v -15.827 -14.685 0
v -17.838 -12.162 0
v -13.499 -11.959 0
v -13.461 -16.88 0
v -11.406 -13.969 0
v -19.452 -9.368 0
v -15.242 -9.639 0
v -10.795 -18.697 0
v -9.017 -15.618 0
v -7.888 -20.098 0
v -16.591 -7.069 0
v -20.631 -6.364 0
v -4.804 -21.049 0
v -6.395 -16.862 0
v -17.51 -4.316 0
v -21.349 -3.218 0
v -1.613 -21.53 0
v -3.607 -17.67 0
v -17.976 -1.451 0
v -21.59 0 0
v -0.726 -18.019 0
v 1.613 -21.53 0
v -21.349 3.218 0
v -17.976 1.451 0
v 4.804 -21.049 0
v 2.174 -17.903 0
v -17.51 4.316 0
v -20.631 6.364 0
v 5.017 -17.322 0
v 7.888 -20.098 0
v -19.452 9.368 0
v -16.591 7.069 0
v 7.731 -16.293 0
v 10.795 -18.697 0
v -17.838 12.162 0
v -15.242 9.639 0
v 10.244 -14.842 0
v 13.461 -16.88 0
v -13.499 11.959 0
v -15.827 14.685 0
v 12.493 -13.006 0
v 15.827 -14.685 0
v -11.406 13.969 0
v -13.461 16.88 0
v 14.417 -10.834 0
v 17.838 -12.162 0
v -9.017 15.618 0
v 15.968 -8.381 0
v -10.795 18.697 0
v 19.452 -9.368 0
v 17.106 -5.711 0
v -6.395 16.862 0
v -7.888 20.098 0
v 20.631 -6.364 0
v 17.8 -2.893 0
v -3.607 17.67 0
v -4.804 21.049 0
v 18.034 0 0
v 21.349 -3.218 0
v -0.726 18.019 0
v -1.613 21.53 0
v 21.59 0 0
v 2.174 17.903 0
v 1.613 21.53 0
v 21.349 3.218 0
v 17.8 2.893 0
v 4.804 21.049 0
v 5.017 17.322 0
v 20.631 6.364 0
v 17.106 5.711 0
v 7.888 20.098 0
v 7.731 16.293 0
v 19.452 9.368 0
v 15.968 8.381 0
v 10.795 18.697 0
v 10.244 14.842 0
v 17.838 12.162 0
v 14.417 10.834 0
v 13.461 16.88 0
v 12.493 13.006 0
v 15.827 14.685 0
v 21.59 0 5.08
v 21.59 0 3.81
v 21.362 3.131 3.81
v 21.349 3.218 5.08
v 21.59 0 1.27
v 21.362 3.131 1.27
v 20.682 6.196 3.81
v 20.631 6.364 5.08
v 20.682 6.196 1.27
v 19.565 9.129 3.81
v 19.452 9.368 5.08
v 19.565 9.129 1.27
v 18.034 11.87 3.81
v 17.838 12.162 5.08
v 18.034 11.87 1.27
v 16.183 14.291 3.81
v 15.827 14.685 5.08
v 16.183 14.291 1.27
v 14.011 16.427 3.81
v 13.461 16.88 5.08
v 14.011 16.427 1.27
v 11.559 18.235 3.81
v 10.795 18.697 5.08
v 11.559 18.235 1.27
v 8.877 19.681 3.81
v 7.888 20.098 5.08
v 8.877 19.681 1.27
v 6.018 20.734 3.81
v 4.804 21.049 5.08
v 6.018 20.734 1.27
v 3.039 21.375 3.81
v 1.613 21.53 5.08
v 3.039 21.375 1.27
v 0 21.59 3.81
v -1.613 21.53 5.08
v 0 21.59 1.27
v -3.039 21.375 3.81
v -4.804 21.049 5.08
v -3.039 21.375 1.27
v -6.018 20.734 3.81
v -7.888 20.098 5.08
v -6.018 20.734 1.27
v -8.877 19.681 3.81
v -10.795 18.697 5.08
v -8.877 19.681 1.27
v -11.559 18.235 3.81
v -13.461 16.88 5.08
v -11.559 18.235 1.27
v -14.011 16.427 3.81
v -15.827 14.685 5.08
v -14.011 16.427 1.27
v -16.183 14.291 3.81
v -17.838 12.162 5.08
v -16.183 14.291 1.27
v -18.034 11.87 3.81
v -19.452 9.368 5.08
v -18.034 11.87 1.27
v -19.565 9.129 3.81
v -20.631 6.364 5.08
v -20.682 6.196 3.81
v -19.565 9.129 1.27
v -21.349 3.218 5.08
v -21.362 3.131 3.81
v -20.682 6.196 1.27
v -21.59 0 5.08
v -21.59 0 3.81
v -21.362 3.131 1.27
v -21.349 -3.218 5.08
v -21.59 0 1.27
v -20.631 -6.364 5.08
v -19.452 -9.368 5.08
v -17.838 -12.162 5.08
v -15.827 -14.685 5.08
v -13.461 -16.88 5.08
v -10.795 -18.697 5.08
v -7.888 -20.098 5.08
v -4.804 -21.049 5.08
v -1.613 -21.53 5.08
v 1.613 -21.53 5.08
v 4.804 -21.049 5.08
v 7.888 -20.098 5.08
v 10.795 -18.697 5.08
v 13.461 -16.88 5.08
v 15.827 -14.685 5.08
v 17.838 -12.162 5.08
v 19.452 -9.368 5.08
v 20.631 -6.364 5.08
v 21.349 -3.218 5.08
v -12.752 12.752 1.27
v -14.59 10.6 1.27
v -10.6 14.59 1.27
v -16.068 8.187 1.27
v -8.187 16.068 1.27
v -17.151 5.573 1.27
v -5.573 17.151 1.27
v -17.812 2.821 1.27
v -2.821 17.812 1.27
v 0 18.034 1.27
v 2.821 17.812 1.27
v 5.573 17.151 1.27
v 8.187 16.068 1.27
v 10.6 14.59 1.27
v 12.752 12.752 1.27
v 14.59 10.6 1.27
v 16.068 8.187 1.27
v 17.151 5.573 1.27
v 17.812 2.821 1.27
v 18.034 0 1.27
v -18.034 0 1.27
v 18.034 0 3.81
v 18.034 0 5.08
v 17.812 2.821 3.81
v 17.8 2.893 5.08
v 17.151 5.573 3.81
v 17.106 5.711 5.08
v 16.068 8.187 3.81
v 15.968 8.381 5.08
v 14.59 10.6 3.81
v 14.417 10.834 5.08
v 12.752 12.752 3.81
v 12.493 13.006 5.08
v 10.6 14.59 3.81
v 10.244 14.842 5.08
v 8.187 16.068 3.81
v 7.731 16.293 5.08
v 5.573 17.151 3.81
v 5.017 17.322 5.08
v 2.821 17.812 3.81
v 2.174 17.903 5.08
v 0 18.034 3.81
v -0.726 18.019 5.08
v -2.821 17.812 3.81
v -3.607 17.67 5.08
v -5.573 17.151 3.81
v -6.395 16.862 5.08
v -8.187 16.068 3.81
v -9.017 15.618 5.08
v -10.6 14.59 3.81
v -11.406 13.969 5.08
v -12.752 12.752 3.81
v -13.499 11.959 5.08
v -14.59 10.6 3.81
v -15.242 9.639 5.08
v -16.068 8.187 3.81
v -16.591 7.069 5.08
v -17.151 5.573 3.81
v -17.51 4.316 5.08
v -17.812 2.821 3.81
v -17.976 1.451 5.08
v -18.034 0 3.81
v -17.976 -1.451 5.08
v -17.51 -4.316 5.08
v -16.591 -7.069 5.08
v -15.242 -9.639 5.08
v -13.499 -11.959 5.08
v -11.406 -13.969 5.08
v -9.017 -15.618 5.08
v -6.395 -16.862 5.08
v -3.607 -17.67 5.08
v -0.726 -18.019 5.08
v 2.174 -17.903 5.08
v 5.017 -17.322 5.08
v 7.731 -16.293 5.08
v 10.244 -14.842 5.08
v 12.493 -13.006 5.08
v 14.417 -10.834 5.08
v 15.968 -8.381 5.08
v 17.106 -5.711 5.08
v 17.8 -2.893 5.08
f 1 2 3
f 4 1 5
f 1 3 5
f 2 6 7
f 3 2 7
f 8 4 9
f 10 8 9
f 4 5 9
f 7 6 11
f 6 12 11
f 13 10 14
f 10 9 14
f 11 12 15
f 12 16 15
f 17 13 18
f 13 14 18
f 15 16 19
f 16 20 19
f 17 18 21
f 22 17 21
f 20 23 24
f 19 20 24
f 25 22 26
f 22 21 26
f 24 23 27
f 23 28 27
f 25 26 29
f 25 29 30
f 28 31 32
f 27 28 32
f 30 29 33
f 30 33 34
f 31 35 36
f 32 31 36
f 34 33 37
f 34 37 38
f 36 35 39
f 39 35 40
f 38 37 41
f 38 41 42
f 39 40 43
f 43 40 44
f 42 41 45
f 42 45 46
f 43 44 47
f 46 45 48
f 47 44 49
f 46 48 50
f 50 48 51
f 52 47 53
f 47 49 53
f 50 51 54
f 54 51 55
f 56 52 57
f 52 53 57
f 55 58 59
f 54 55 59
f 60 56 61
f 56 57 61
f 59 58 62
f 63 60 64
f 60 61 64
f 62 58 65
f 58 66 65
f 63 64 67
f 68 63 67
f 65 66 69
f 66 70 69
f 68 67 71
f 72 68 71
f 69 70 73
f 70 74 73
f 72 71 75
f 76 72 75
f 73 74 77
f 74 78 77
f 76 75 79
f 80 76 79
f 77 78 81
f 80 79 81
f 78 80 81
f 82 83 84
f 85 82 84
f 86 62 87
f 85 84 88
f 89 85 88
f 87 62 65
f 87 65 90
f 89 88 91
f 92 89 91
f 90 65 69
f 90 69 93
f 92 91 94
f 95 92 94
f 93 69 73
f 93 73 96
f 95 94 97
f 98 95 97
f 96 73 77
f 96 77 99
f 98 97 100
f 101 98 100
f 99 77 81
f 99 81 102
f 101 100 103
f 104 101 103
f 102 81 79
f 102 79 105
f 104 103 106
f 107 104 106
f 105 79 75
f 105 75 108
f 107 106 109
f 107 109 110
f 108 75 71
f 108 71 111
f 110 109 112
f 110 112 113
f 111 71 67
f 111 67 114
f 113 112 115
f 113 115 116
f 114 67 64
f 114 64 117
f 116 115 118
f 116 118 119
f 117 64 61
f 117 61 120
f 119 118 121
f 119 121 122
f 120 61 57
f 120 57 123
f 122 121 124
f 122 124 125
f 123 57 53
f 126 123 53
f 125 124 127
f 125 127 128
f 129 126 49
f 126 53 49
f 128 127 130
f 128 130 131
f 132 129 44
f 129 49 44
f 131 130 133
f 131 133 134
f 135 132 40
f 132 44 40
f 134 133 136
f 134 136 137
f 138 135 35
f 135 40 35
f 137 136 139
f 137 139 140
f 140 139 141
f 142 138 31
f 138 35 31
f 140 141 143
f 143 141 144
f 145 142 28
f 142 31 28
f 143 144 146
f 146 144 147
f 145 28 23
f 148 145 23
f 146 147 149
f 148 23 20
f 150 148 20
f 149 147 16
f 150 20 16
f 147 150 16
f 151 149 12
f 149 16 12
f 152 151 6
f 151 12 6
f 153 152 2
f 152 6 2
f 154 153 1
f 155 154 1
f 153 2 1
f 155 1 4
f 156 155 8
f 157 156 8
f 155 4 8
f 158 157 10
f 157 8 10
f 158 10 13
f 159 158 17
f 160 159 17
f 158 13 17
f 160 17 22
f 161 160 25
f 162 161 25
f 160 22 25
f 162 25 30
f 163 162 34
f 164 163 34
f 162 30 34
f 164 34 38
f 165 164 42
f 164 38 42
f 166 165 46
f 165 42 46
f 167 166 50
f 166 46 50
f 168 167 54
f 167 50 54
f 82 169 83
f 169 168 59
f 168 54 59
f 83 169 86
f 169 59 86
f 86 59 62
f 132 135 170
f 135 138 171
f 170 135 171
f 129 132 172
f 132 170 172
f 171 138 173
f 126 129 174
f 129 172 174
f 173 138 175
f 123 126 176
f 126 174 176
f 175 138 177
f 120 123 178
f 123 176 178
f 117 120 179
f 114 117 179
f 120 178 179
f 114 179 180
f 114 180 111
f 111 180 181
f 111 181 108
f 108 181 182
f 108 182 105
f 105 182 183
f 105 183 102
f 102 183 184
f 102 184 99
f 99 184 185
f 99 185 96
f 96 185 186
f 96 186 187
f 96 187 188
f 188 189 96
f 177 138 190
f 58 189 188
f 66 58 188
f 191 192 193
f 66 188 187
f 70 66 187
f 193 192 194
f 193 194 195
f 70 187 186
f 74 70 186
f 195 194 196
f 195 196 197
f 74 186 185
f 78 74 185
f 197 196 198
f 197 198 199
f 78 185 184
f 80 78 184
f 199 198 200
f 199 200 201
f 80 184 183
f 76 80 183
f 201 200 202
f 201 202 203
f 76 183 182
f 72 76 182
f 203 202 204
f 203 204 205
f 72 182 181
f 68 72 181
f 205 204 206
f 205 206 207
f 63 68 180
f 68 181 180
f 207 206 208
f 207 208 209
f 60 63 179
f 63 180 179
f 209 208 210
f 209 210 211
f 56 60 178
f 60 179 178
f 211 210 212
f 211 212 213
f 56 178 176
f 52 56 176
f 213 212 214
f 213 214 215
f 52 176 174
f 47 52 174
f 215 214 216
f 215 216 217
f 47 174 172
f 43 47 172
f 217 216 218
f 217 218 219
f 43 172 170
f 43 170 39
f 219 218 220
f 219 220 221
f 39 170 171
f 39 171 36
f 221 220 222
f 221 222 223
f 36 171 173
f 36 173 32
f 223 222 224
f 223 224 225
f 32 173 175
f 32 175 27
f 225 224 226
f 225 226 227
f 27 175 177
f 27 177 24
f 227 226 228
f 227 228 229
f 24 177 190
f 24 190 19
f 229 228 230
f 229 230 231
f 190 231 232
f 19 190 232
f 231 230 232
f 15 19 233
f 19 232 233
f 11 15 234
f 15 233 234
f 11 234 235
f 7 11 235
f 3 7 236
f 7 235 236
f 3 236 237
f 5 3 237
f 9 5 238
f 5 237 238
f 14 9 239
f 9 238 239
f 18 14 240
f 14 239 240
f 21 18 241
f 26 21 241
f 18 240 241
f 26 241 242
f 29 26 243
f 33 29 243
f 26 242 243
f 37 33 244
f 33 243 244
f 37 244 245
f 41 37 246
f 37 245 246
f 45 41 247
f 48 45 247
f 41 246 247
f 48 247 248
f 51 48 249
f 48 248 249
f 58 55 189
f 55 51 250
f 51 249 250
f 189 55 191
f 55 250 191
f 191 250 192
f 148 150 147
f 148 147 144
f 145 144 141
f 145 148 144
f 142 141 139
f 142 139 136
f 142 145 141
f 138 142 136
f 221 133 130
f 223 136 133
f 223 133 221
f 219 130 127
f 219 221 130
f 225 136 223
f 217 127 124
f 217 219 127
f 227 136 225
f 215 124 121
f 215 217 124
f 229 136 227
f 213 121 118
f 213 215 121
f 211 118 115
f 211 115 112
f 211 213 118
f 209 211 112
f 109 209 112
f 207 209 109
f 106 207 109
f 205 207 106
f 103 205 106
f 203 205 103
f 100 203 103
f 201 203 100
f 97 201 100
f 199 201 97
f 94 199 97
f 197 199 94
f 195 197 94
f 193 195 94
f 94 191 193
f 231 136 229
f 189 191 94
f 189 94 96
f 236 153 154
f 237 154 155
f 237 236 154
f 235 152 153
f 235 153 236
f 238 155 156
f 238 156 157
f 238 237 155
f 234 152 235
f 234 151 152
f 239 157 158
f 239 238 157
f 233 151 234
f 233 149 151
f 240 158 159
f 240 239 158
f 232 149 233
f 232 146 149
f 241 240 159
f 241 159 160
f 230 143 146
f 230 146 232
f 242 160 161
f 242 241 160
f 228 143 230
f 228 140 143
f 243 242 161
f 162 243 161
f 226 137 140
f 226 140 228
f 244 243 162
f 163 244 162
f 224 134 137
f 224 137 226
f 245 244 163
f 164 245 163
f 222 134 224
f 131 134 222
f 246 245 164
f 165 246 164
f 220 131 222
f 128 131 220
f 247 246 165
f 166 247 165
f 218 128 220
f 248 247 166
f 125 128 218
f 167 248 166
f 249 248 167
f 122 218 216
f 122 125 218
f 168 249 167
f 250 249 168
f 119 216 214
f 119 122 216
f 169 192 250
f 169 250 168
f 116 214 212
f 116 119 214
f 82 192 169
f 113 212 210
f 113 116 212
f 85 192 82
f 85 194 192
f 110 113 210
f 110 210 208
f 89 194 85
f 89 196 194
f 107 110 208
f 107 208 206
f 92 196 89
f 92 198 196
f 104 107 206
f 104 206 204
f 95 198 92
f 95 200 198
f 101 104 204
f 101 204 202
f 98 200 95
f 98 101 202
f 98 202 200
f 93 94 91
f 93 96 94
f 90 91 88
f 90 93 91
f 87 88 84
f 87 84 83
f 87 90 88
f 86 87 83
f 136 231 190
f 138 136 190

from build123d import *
from build123d.topology import SkipClean

# Parameters (mm, degrees)
SKETCH1_R                = 21.59
BOSS_EXTRUDE1_DEPTH      = 5.08
SKETCH4_R                = 18.034
CUT_EXTRUDE1_DEPTH       = 31.952586322
SKETCH5_W                = 43.18
SKETCH5_H                = 2.54
CUT_EXTRUDE2_DEPTH       = 31.952586322
BOSS_EXTRUDE2_REACH      = 32.953
BOSS_EXTRUDE2_END_RADIUS = 21.59
SKETCH6_W                = 3.556
SKETCH6_H                = 2.54


with BuildPart() as part:
    # Sketch1 → Boss-Extrude1 (new body)
    with BuildSketch(Plane.XY):
        Circle(SKETCH1_R)
    extrude(amount=BOSS_EXTRUDE1_DEPTH)

    # Sketch4 → Cut-Extrude1 (cut, through all)
    with BuildSketch(Plane.XY.offset(5.08)):
        Circle(SKETCH4_R)
    extrude(amount=-CUT_EXTRUDE1_DEPTH, mode=Mode.SUBTRACT)

    # Sketch5 → Cut-Extrude2 (cut, through all)
    with BuildSketch(Plane(origin=(0, 0, 0), x_dir=(1, 0, 0), z_dir=(0, 1, 0))):
        with Locations((0, -2.54)):
            Rectangle(SKETCH5_W, SKETCH5_H)
    extrude(amount=CUT_EXTRUDE2_DEPTH, mode=Mode.SUBTRACT)

    # Boss-Extrude2: up to this cylinder (the profile starts inside it)
    with SkipClean():  # the faces are left unmerged after this step: merging them gives an invalid solid
        boss_extrude2_end = Plane(origin=(0, 0, 2.54), z_dir=(0, 0, -1)) * Cylinder(BOSS_EXTRUDE2_END_RADIUS, 110.086, mode=Mode.PRIVATE)
        # Sketch6 → Boss-Extrude2 (add, up to the surface)
        with BuildSketch(Plane(origin=(0, 0, 0), x_dir=(1, 0, 0), z_dir=(0, 1, 0)), mode=Mode.PRIVATE) as boss_extrude2_sk1:
            with Locations((-19.812, -2.54)):
                Rectangle(SKETCH6_W, SKETCH6_H)
        boss_extrude2_tool1 = extrude(boss_extrude2_sk1.sketch, amount=BOSS_EXTRUDE2_REACH, mode=Mode.PRIVATE) & boss_extrude2_end
        add(boss_extrude2_tool1.solids().sort_by_distance((-19.812, 0, 2.54))[0])
        # Sketch6 → Boss-Extrude2 (add, up to the surface)
        with BuildSketch(Plane(origin=(0, 0, 0), x_dir=(1, 0, 0), z_dir=(0, 1, 0)), mode=Mode.PRIVATE) as boss_extrude2_sk2:
            with Locations((19.812, -2.54)):
                Rectangle(SKETCH6_W, SKETCH6_H)
        boss_extrude2_tool2 = extrude(boss_extrude2_sk2.sketch, amount=BOSS_EXTRUDE2_REACH, mode=Mode.PRIVATE) & boss_extrude2_end
        add(boss_extrude2_tool2.solids().sort_by_distance((19.812, 0, 2.54))[0])


solid = part.part
